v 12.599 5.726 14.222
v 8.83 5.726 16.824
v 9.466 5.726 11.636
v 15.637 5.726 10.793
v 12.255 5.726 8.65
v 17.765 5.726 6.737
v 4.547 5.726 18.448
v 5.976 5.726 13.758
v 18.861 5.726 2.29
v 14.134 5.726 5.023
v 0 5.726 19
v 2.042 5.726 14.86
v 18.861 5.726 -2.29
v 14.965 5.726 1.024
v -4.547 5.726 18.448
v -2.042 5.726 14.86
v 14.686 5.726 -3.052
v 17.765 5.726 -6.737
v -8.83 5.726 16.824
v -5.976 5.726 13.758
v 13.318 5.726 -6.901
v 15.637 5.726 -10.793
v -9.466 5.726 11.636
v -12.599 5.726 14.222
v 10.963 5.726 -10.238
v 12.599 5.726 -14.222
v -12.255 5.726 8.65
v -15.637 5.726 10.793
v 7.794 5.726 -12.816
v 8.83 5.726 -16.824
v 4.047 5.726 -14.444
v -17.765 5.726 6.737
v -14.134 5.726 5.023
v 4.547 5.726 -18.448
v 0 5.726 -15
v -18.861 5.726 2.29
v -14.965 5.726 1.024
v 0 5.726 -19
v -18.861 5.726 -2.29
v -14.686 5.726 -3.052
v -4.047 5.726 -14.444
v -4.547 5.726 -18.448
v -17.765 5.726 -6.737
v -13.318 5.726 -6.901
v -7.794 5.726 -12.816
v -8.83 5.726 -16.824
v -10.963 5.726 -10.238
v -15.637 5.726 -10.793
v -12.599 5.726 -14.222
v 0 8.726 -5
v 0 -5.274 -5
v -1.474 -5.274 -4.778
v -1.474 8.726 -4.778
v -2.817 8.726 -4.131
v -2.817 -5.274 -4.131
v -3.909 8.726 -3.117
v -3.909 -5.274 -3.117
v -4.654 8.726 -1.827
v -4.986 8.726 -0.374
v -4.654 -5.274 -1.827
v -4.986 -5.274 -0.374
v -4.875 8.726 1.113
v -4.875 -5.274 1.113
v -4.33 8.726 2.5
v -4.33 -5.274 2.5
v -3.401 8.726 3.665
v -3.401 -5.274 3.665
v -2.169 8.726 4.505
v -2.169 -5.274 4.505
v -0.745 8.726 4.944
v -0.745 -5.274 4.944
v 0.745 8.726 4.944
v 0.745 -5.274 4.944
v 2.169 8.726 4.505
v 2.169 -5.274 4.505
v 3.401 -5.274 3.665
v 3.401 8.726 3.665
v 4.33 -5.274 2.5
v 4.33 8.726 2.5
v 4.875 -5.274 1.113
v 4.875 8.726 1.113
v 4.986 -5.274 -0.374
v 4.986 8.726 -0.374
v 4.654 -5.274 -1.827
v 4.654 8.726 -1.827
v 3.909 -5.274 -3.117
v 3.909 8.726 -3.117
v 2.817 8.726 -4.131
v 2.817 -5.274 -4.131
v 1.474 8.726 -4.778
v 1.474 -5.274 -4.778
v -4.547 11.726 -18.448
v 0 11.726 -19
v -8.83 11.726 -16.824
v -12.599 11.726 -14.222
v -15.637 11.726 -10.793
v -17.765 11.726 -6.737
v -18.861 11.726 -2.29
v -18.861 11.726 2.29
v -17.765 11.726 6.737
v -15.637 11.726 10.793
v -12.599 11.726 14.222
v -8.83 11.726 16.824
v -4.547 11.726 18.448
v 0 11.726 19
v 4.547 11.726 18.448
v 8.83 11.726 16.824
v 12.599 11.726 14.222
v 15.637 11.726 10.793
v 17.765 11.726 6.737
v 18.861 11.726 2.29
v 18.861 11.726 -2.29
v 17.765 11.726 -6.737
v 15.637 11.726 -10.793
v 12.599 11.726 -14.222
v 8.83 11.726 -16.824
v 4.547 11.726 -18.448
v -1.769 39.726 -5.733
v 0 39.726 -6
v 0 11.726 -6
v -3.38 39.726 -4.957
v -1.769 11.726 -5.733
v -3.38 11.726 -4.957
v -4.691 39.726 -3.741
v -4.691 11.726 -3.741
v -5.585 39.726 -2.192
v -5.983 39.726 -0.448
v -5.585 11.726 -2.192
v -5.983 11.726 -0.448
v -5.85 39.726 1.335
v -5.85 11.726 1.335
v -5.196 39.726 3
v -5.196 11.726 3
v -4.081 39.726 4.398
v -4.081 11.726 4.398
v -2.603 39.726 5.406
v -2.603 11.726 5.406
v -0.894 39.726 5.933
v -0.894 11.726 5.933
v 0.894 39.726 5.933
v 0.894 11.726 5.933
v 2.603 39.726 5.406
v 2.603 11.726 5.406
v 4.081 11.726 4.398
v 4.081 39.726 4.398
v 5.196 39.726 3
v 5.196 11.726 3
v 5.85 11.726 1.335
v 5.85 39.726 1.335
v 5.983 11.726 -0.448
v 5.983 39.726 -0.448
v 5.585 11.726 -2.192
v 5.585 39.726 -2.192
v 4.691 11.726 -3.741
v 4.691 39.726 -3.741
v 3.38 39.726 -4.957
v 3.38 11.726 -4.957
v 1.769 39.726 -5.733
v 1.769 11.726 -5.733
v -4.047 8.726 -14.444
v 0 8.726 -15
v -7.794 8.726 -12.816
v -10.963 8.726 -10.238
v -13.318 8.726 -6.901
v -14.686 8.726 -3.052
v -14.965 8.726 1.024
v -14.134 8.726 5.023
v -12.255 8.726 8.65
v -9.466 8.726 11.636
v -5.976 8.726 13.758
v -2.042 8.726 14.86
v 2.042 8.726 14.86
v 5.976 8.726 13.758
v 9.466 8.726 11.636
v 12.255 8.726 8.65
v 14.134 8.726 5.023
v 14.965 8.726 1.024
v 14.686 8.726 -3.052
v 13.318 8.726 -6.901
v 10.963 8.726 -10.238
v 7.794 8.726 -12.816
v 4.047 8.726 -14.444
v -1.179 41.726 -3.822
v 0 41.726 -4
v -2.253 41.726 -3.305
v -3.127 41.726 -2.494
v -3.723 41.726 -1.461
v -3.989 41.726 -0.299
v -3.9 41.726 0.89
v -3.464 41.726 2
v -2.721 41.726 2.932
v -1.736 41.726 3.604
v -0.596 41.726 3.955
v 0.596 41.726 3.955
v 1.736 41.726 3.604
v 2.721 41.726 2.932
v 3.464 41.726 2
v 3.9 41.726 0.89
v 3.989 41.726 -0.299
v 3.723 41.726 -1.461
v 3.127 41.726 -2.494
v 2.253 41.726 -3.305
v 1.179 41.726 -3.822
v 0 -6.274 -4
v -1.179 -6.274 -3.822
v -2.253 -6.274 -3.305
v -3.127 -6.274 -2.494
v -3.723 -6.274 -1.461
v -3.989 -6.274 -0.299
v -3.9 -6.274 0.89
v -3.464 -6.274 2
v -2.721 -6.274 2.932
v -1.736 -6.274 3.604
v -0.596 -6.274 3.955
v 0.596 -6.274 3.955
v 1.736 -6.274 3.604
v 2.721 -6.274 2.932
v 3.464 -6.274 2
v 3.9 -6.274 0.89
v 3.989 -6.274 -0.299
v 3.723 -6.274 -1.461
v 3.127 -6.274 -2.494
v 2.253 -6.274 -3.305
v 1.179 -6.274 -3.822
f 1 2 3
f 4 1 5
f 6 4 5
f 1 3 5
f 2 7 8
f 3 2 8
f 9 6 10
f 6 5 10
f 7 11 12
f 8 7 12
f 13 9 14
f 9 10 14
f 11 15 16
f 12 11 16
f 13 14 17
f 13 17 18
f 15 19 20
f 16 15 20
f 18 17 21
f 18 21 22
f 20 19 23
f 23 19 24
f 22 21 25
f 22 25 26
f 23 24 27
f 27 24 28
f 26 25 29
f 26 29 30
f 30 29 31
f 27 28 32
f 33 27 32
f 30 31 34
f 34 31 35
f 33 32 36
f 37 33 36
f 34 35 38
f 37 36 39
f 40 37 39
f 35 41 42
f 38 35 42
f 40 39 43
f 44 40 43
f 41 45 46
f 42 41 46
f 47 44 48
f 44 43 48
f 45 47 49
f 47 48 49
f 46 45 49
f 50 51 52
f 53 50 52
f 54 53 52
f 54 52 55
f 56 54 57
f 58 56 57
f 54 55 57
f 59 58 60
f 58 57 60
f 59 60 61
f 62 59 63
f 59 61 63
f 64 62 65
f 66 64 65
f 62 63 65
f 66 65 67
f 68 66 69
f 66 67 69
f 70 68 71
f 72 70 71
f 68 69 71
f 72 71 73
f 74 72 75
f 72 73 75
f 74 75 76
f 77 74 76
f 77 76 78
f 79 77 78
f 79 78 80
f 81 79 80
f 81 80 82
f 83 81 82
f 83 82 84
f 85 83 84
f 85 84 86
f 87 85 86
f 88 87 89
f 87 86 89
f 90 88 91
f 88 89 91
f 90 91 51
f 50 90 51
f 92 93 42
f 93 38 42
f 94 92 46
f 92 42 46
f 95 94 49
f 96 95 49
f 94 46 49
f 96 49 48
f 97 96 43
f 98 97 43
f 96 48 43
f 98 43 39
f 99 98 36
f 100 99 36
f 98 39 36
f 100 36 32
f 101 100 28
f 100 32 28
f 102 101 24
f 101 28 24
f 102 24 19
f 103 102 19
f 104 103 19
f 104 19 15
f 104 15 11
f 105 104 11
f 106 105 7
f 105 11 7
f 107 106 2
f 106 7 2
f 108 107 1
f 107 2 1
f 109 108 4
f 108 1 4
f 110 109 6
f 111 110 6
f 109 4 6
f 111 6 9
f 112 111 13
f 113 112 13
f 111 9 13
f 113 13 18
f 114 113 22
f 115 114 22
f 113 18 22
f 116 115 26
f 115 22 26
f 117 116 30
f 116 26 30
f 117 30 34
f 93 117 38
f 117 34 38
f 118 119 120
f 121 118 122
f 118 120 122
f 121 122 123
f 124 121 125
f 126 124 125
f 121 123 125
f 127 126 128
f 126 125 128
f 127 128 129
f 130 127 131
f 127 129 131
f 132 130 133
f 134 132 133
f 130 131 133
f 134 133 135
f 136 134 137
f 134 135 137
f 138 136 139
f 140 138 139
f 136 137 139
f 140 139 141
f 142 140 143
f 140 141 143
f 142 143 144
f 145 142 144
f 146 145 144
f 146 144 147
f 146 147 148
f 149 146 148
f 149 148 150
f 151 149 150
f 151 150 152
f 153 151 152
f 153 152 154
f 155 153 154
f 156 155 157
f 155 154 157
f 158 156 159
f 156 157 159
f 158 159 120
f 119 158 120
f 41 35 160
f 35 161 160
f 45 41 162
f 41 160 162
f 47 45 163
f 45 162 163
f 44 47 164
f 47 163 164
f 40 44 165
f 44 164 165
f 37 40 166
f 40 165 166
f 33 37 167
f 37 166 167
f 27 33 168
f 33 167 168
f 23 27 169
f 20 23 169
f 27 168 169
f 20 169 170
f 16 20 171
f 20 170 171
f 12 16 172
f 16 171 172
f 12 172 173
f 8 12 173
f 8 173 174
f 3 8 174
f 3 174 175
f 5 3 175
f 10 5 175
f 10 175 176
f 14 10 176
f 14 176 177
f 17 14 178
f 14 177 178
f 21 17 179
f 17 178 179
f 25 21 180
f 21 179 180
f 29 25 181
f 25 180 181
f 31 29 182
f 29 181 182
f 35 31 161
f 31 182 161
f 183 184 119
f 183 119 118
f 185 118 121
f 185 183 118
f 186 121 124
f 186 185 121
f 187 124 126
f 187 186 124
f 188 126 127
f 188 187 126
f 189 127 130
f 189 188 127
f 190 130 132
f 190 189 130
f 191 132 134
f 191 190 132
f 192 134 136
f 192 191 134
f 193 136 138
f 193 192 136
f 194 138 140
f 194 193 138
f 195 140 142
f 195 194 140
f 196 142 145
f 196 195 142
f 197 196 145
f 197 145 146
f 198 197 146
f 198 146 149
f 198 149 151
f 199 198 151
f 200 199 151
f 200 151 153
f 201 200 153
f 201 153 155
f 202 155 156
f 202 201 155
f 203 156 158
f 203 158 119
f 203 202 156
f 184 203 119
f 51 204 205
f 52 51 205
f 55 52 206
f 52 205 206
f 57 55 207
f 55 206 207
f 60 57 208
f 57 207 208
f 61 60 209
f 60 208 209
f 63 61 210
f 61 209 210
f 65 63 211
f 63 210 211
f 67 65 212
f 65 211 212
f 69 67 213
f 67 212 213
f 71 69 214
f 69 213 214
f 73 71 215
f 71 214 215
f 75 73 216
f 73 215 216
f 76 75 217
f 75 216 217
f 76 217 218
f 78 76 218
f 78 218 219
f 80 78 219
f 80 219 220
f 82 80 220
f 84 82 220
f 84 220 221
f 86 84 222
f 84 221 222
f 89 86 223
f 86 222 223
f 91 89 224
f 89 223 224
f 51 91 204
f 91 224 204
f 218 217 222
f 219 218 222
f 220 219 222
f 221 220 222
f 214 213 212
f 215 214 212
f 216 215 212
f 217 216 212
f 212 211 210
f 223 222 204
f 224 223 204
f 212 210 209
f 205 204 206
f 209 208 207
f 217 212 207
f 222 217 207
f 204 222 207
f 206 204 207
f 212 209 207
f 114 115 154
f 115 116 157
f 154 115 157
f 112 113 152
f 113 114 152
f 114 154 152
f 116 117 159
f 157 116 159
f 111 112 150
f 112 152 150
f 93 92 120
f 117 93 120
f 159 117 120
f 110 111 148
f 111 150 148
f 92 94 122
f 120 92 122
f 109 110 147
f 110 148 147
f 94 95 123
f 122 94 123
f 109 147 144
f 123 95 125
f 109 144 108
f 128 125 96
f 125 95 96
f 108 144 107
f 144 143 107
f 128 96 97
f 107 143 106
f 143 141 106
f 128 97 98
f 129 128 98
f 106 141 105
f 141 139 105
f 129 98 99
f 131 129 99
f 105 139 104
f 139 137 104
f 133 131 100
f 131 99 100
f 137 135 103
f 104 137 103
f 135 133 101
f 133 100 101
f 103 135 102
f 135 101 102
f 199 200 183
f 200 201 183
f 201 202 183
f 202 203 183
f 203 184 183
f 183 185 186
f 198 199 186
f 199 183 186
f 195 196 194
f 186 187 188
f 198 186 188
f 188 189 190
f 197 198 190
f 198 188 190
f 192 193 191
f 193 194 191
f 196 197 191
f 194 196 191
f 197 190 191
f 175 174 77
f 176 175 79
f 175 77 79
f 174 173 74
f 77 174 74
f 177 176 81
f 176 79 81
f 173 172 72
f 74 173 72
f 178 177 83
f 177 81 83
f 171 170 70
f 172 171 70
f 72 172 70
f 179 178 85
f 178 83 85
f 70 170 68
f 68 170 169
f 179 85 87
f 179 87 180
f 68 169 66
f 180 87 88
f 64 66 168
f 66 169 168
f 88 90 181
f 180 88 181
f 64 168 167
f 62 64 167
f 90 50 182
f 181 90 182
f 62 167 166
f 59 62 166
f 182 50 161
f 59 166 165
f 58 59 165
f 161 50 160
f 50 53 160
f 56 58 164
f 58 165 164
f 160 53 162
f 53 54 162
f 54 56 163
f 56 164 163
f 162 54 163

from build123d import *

# Parameters (mm, degrees)
CHAMFER1_SIZE = 1
CHAMFER2_SIZE = 2


with BuildPart() as part:
    # Sketch1 → Revolve1 (revolve)
    with BuildSketch(Plane.XY, mode=Mode.PRIVATE) as revolve1_sk:
        Polygon((0, 41.725973007), (-6, 41.725973007), (-6, 11.725973007), (-19, 11.725973007), (-19, 5.725973007), (-15, 5.725973007), (-15, 8.725973007), (-5, 8.725973007), (-5, -6.274026993), (0, -6.274026993), align=None)
    revolve(revolve1_sk.sketch.rotate(Axis((0, 0, 0), (0, 1, 0)), 270), axis=Axis((0, 0, 0), (0, 1, 0)))

    # Chamfer1
    chamfer1_edges = [part.edges().sort_by_distance(p)[0] for p in [
        (0, -6.274026993, 5),
    ]]
    chamfer(chamfer1_edges, length=CHAMFER1_SIZE)

    # Chamfer2
    chamfer2_edges = [part.edges().sort_by_distance(p)[0] for p in [
        (0, 41.725973007, 6),
    ]]
    chamfer(chamfer2_edges, length=CHAMFER2_SIZE)


solid = part.part
